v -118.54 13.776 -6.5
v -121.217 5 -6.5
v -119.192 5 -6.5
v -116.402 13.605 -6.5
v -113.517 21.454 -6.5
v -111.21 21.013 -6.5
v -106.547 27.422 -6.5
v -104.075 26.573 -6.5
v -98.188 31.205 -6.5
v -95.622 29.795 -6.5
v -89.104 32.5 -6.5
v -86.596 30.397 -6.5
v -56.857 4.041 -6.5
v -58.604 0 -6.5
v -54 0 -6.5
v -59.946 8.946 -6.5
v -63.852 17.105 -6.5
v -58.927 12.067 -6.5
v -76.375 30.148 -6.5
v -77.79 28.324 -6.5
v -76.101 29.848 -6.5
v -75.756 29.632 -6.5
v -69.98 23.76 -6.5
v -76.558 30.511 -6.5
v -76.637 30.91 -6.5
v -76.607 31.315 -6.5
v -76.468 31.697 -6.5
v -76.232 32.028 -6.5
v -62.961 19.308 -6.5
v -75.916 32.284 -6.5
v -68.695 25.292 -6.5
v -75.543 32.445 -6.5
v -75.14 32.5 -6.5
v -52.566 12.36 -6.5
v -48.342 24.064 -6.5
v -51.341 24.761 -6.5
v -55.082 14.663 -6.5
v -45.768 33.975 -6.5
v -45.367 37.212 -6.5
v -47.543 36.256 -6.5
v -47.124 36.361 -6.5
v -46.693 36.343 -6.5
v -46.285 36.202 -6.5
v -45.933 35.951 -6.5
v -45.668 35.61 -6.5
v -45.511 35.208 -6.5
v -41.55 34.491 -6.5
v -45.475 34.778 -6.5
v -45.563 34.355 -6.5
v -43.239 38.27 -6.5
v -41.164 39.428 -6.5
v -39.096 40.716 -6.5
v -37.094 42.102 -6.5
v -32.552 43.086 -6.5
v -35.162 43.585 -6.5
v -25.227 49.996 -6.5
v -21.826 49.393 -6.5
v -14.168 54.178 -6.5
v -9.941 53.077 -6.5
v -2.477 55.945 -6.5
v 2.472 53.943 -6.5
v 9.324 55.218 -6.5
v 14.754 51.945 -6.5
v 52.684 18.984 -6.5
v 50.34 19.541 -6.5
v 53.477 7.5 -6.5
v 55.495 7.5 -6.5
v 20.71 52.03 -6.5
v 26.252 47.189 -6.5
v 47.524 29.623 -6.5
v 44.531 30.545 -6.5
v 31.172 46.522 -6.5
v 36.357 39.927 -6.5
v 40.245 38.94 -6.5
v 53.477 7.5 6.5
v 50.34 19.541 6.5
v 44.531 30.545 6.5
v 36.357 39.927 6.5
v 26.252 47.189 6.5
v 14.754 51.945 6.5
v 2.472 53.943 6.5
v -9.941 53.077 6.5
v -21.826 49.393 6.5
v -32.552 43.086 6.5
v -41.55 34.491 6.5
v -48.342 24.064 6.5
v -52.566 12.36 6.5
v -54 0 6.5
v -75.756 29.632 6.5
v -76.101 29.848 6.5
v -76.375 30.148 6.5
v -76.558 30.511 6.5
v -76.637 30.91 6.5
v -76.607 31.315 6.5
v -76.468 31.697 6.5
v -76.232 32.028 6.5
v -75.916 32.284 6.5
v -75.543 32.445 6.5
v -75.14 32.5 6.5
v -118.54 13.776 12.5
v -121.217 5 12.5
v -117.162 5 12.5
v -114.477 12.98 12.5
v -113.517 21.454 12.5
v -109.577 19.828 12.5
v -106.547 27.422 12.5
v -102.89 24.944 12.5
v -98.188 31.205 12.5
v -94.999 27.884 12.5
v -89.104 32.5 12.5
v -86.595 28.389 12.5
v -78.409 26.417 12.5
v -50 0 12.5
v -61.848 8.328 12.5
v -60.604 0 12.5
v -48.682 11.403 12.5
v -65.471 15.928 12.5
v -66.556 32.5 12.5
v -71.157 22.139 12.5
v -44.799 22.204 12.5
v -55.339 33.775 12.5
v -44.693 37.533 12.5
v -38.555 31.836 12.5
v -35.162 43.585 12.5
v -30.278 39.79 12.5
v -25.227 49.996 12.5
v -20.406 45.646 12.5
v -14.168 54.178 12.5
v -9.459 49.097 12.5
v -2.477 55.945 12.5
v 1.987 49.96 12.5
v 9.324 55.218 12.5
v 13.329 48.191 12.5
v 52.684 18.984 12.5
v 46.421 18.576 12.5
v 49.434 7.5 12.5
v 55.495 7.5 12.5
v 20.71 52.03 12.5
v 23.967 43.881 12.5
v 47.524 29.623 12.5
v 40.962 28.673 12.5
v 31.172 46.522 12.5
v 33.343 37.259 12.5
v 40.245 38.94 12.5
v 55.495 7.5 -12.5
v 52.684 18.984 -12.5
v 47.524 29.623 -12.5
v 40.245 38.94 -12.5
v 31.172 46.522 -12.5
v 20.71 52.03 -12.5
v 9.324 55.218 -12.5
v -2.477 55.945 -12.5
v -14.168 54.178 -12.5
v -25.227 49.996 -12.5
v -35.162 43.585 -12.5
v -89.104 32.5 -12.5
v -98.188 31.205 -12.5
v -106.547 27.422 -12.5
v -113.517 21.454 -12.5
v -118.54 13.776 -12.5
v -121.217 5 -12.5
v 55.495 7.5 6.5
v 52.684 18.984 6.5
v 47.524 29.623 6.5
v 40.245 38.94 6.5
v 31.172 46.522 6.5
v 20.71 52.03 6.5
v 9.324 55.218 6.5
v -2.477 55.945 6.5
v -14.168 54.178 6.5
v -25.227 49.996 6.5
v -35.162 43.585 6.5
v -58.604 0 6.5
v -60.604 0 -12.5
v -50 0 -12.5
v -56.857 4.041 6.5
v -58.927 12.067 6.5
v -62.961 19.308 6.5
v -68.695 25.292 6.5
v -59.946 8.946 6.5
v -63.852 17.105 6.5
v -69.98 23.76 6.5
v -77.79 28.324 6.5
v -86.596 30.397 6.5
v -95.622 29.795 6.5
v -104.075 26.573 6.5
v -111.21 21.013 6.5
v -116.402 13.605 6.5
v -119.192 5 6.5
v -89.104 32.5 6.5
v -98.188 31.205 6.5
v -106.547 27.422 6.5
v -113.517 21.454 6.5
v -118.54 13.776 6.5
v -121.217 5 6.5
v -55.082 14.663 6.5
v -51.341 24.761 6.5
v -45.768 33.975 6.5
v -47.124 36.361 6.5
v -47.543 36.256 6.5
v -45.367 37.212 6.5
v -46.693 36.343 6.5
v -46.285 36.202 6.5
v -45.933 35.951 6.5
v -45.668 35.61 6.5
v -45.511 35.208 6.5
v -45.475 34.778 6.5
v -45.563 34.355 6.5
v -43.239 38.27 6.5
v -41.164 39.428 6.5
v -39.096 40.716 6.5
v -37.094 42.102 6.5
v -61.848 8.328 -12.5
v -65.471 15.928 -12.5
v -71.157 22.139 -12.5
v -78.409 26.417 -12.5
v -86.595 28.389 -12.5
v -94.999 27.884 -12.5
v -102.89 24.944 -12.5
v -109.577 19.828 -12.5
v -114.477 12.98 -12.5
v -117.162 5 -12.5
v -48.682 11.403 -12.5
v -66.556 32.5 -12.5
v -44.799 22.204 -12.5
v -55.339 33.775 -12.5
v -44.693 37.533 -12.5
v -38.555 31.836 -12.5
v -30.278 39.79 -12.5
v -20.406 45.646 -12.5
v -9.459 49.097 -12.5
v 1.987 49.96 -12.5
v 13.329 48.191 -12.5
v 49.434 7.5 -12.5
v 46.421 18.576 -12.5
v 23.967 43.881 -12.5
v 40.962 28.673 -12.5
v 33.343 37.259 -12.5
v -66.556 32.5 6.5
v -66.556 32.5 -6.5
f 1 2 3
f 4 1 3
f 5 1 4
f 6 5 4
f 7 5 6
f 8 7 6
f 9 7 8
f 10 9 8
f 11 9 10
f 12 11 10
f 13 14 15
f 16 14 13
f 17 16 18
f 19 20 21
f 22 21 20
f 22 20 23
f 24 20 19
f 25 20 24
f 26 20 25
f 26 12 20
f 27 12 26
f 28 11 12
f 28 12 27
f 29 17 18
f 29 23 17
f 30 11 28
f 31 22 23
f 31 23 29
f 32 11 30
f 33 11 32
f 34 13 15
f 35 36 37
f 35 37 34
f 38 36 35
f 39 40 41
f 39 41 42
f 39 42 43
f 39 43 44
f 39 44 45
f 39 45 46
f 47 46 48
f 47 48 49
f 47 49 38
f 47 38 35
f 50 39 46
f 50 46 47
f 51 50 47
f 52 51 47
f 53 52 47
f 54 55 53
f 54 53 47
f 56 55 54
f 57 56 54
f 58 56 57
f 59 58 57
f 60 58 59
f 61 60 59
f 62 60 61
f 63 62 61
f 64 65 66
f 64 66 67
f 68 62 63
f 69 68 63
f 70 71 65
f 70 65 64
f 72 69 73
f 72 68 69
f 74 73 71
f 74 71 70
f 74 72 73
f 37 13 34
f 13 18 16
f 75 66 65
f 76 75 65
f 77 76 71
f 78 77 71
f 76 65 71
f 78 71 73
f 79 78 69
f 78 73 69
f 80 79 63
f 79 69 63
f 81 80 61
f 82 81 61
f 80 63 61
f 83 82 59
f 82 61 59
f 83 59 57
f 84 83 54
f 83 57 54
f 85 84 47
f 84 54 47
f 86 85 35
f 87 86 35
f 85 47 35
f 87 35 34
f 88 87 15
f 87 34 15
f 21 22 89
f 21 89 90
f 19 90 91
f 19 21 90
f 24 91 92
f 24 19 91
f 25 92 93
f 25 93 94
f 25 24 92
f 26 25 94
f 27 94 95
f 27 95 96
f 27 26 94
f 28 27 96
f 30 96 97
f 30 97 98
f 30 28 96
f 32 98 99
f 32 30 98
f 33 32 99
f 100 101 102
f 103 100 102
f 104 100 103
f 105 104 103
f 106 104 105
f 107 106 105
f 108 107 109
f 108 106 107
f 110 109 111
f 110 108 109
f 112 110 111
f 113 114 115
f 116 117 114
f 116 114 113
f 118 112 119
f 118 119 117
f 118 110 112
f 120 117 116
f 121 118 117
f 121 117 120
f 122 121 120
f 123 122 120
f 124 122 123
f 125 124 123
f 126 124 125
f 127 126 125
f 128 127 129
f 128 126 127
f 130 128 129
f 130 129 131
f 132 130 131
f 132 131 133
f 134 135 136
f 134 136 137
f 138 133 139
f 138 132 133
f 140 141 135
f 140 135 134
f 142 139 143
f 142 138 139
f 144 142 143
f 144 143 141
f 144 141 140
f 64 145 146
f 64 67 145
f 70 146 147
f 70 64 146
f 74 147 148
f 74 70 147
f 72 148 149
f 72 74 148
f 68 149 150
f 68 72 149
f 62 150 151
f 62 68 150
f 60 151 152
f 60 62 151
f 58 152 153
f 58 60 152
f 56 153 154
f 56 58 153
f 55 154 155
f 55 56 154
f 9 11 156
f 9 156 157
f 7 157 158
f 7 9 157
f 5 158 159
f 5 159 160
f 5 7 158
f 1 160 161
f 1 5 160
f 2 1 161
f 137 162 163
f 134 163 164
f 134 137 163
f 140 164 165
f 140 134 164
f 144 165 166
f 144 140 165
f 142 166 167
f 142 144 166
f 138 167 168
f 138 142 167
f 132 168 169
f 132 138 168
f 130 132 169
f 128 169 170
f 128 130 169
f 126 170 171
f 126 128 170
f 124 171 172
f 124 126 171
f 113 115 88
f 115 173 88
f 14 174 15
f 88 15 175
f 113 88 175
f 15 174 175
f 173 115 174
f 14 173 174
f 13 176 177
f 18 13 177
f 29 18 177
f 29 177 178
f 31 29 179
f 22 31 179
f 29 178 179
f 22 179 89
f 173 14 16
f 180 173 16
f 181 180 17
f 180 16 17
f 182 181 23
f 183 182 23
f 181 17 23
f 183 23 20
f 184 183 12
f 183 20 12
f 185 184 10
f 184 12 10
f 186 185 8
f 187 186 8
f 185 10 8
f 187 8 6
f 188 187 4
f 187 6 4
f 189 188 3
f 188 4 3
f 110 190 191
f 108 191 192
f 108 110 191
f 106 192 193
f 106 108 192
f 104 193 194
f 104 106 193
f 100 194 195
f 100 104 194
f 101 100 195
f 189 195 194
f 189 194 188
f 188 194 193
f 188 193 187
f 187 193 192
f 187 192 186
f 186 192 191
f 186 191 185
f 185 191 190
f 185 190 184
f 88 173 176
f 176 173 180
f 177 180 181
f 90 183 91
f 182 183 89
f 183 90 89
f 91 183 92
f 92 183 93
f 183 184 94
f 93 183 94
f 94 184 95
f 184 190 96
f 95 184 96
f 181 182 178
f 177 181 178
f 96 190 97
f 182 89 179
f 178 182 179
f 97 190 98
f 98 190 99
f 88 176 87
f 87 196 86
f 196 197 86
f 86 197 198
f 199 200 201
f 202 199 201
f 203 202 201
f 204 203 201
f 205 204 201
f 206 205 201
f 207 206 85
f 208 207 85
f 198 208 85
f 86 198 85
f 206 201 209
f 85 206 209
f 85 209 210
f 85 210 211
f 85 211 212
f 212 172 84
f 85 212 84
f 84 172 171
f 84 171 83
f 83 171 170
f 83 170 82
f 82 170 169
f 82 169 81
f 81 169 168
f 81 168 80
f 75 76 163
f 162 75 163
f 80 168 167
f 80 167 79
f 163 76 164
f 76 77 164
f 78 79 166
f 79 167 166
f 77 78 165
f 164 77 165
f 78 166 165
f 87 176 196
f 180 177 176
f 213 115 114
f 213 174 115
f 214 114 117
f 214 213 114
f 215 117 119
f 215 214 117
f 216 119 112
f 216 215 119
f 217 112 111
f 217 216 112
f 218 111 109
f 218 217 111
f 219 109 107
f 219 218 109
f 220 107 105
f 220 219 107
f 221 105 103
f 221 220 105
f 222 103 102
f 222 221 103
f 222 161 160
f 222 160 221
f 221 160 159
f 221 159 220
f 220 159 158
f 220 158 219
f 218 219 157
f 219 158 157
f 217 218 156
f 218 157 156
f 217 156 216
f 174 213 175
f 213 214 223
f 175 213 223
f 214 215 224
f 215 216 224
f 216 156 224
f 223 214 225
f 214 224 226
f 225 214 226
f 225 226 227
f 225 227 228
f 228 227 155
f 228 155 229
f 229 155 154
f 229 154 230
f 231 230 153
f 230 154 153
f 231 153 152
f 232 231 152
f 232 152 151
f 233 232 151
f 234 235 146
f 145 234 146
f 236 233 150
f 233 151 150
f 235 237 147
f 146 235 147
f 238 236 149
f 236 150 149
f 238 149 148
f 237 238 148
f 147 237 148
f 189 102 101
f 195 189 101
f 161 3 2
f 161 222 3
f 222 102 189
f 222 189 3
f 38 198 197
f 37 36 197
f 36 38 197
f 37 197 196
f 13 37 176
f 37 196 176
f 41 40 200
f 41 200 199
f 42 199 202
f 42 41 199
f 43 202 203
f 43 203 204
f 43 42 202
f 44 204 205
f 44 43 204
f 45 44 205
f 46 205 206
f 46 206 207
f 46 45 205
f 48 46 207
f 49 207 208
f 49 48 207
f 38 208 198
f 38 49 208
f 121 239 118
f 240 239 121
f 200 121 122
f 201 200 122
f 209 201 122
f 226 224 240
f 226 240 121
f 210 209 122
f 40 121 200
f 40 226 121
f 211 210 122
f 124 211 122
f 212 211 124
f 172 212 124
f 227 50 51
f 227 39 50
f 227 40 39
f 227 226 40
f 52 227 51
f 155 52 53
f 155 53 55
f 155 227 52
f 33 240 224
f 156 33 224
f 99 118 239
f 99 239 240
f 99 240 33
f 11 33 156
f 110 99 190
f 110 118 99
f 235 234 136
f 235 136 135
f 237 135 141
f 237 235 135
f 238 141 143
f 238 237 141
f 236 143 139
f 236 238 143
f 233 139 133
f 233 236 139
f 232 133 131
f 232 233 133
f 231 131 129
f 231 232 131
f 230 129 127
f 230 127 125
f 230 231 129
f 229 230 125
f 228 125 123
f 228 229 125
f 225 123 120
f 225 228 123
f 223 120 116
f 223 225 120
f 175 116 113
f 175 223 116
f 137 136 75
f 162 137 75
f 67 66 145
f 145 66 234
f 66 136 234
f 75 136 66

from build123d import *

# Parameters (mm, degrees)
SKETCH1_R                     = 56
SKETCH1_R_2                   = 50
MAIN_SHAPE_DEPTH              = 12.5
LIGHT_MOUNT_REACH             = 82.176
LIGHT_MOUNT_DIRECTION_2_REACH = 82.176
SKETCH3_R                     = 57
SKETCH3_R_2                   = 54
MAIN_SLOT_DEPTH               = 6.5
LIGHT_CUT_DEPTH               = 135.461332618
LIGHT_CUT_DEPTH_BACK          = 135.461332618
SKETCH8_R                     = 28.5
SKETCH9_R                     = 32.5
SKETCH9_R_2                   = 30.5
LIGHT_SLOT_DEPTH              = 6.5
LIGHT_MOUNT_FILLET_R          = 50
SKETCH17_W                    = 4.884048614
SKETCH17_H                    = 10
LIGHT_KEYWAY_DEPTH            = 137.193244948
SKETCH19_W                    = 25
SKETCH19_H                    = 15
CUT_EXTRUDE1_DEPTH            = 135.11151246
FILLET1_START                 = -6.5
FILLET1_DEPTH                 = 13
SKETCH20_W                    = 284.103750492
SKETCH20_H                    = 110.008077322
CUT_EXTRUDE2_DEPTH            = 135.11151246


with BuildPart() as part:
    # Sketch1 → main shape (new, symmetric)
    with BuildSketch(Plane.XY):
        Circle(SKETCH1_R)
        Circle(SKETCH1_R_2, mode=Mode.SUBTRACT)
    extrude(amount=MAIN_SHAPE_DEPTH, both=True)

    # light mount: up to this face of the body (flat: up to its plane)
    light_mount_end = Plane(part.part.faces().sort_by_distance((-54.41608081, 0, 12.5))[0])
    # Sketch6 → light mount (add, up to the picked face)
    with BuildSketch(Plane.XY, mode=Mode.PRIVATE) as light_mount_sk1:
        with BuildLine():
            Line((-45.604276115, 32.5), (-89.104276115, 32.5))
            ThreePointArc((-89.104276115, 32.5), (-121.604276115, 0), (-89.104276115, -32.5))
            Line((-89.104276115, -32.5), (-45.604276115, -32.5))
            ThreePointArc((-45.604276115, -32.5), (-56, 0), (-45.604276115, 32.5))
        make_face()
    light_mount_tool1 = split(extrude(light_mount_sk1.sketch, amount=LIGHT_MOUNT_REACH, mode=Mode.PRIVATE), bisect_by=light_mount_end, keep=Keep.BOTH, mode=Mode.PRIVATE)
    add(light_mount_tool1.solids().sort_by(Axis((-84.001692, 0, 0), (0, 0, 1)))[0])

    # light mount direction 2: up to this face of the body (flat: up to its plane)
    light_mount_direction_2_end = Plane(part.part.faces().sort_by_distance((-54.41608081, 0, -12.5))[0])
    # Sketch6 → light mount direction 2 (add, up to the picked face)
    with BuildSketch(Plane.XY, mode=Mode.PRIVATE) as light_mount_direction_2_sk1:
        with BuildLine():
            Line((-45.604276115, 32.5), (-89.104276115, 32.5))
            ThreePointArc((-89.104276115, 32.5), (-121.604276115, 0), (-89.104276115, -32.5))
            Line((-89.104276115, -32.5), (-45.604276115, -32.5))
            ThreePointArc((-45.604276115, -32.5), (-56, 0), (-45.604276115, 32.5))
        make_face()
    light_mount_direction_2_tool1 = split(extrude(light_mount_direction_2_sk1.sketch, amount=-LIGHT_MOUNT_DIRECTION_2_REACH, mode=Mode.PRIVATE), bisect_by=light_mount_direction_2_end, keep=Keep.BOTH, mode=Mode.PRIVATE)
    add(light_mount_direction_2_tool1.solids().sort_by(Axis((-84.001692, 0, 0), (0, 0, -1)))[0])

    # Sketch3 → main slot (cut, symmetric)
    with BuildSketch(Plane.XY):
        Circle(SKETCH3_R)
        Circle(SKETCH3_R_2, mode=Mode.SUBTRACT)
    extrude(amount=MAIN_SLOT_DEPTH, both=True, mode=Mode.SUBTRACT)

    # Sketch8 → light cut (cut, two sides: drawn at the far end of the back side and taken through both)
    with BuildSketch(Plane.XY.offset(-LIGHT_CUT_DEPTH_BACK)):
        with Locations((-89.104276115, 0)):
            Circle(SKETCH8_R)
    extrude(amount=LIGHT_CUT_DEPTH + LIGHT_CUT_DEPTH_BACK, mode=Mode.SUBTRACT)

    # Sketch9 → light slot (cut, symmetric)
    with BuildSketch(Plane.XY):
        with Locations((-89.104276115, 0)):
            Circle(SKETCH9_R)
        with Locations((-89.104276115, 0)):
            Circle(SKETCH9_R_2, mode=Mode.SUBTRACT)
    extrude(amount=LIGHT_SLOT_DEPTH, both=True, mode=Mode.SUBTRACT)

    # light mount fillet
    # the kernel refuses this fillet: 50 mm, written as the material it adds along each edge
    with BuildSketch(Plane(origin=(-45.604276115, 32.5, -12.5), x_dir=(0.6856978375591282, 0.7278863067586417, 0), z_dir=(0, 0, 1))) as light_mount_fillet_piece_1_section:
        with BuildLine():
            CenterArc((22.027511865, 49.535631995), LIGHT_MOUNT_FILLET_R, 223.290512858, 38.89464037)
            Line((-14.366803473, 15.250740117), (0, 0))
            ThreePointArc((0, 0), (7.614448546, 0.520092165), (15.228897092, 0))
        make_face()
    light_mount_fillet_piece_1 = extrude(amount=6, mode=Mode.PRIVATE)
    light_mount_fillet_piece_1 = light_mount_fillet_piece_1 & Plane(origin=(0, 0, -12.5), x_dir=(1, 0, 0), z_dir=(0, 0, 1)) * Cylinder(57, 74, mode=Mode.PRIVATE)
    add(light_mount_fillet_piece_1)
    with BuildSketch(Plane(origin=(-45.604276115, 32.5, -12.5), x_dir=(0.6856978375591282, 0.7278863067586417, 0), z_dir=(0, 0, 1))) as light_mount_fillet_piece_2_section:
        with BuildLine():
            CenterArc((22.027511865, 49.535631995), LIGHT_MOUNT_FILLET_R, 223.290512858, 38.89464037)
            Line((-14.366803473, 15.250740117), (0, 0))
            ThreePointArc((0, 0), (7.614448546, 0.520092165), (15.228897092, 0))
        make_face()
    light_mount_fillet_piece_2 = extrude(amount=6, mode=Mode.PRIVATE)
    light_mount_fillet_piece_2 = light_mount_fillet_piece_2 - Plane(origin=(0, 0, -12.5), x_dir=(1, 0, 0), z_dir=(0, 0, 1)) * Cylinder(57, 74, mode=Mode.PRIVATE)
    add(light_mount_fillet_piece_2)
    with BuildSketch(Plane(origin=(-45.604276115, 32.5, -12.5), x_dir=(0.6856978375591282, 0.7278863067586417, 0), z_dir=(0, 0, 1))) as light_mount_fillet_piece_3_section:
        with BuildLine():
            CenterArc((22.027511865, 49.535631995), LIGHT_MOUNT_FILLET_R, 223.290512858, 38.89464037)
            Line((-14.366803473, 15.250740117), (0, 0))
            ThreePointArc((0, 0), (7.614448546, 0.520092165), (15.228897092, 0))
        make_face()
    light_mount_fillet_piece_3 = extrude(amount=58.380227433, mode=Mode.PRIVATE)
    light_mount_fillet_piece_3 = split(light_mount_fillet_piece_3, bisect_by=Plane(origin=(-45.604276115, 32.5, -6.5), z_dir=(0, 0, 1)), keep=Keep.TOP, mode=Mode.PRIVATE)
    light_mount_fillet_piece_3 = split(light_mount_fillet_piece_3, bisect_by=Plane(origin=(-45.604276115, 32.5, 6.5), z_dir=(0, 0, -1)), keep=Keep.TOP, mode=Mode.PRIVATE)
    light_mount_fillet_piece_3 = light_mount_fillet_piece_3 - Plane(origin=(0, 0, -12.5), x_dir=(1, 0, 0), z_dir=(0, 0, 1)) * Cylinder(57, 178, mode=Mode.PRIVATE)
    add(light_mount_fillet_piece_3)
    with BuildSketch(Plane(origin=(-45.604276115, 32.5, -12.5), x_dir=(0.6856978375591282, 0.7278863067586417, 0), z_dir=(0, 0, 1))) as light_mount_fillet_piece_4_section:
        with BuildLine():
            CenterArc((22.027511865, 49.535631995), LIGHT_MOUNT_FILLET_R, 223.290512858, 38.89464037)
            Line((-14.366803473, 15.250740117), (0, 0))
            ThreePointArc((0, 0), (7.614448546, 0.520092165), (15.228897092, 0))
        make_face()
    light_mount_fillet_piece_4 = extrude(amount=58.380227433, mode=Mode.PRIVATE)
    light_mount_fillet_piece_4 = split(light_mount_fillet_piece_4, bisect_by=Plane(origin=(-45.604276115, 32.5, 12.5), z_dir=(0, 0, -1)), keep=Keep.TOP, mode=Mode.PRIVATE)
    light_mount_fillet_piece_4 = split(light_mount_fillet_piece_4, bisect_by=Plane(origin=(-45.604276115, 32.5, 6.5), z_dir=(0, 0, 1)), keep=Keep.TOP, mode=Mode.PRIVATE)
    light_mount_fillet_piece_4 = light_mount_fillet_piece_4 & Plane(origin=(0, 0, -12.5), x_dir=(1, 0, 0), z_dir=(0, 0, 1)) * Cylinder(57, 178, mode=Mode.PRIVATE)
    add(light_mount_fillet_piece_4)
    with BuildSketch(Plane(origin=(-45.604276115, 32.5, -12.5), x_dir=(0.6856978375591282, 0.7278863067586417, 0), z_dir=(0, 0, 1))) as light_mount_fillet_piece_5_section:
        with BuildLine():
            CenterArc((22.027511865, 49.535631995), LIGHT_MOUNT_FILLET_R, 223.290512858, 38.89464037)
            Line((-14.366803473, 15.250740117), (0, 0))
            ThreePointArc((0, 0), (7.614448546, 0.520092165), (15.228897092, 0))
        make_face()
    light_mount_fillet_piece_5 = extrude(amount=58.380227433, mode=Mode.PRIVATE)
    light_mount_fillet_piece_5 = split(light_mount_fillet_piece_5, bisect_by=Plane(origin=(-45.604276115, 32.5, 12.5), z_dir=(0, 0, -1)), keep=Keep.TOP, mode=Mode.PRIVATE)
    light_mount_fillet_piece_5 = split(light_mount_fillet_piece_5, bisect_by=Plane(origin=(-45.604276115, 32.5, 6.5), z_dir=(0, 0, 1)), keep=Keep.TOP, mode=Mode.PRIVATE)
    light_mount_fillet_piece_5 = light_mount_fillet_piece_5 - Plane(origin=(0, 0, -12.5), x_dir=(1, 0, 0), z_dir=(0, 0, 1)) * Cylinder(57, 178, mode=Mode.PRIVATE)
    add(light_mount_fillet_piece_5)
    with BuildSketch(Plane(origin=(-45.604276115, 32.5, -45.880227433), x_dir=(-1, 0, 0), z_dir=(0, 0, 1))) as light_mount_fillet_piece_6_section:
        with BuildLine():
            CenterArc((20.952090973, -50), LIGHT_MOUNT_FILLET_R, 90, 38.89464037)
            ThreePointArc((-10.442421804, -11.08490566), (-4.842642937, -5.899078903), (0, 0))
            Line((0, 0), (20.952090973, 0))
        make_face()
    light_mount_fillet_piece_6 = extrude(amount=58.380227433, mode=Mode.PRIVATE)
    light_mount_fillet_piece_6 = split(light_mount_fillet_piece_6, bisect_by=Plane(origin=(-45.604276115, 32.5, -6.5), z_dir=(0, 0, -1)), keep=Keep.TOP, mode=Mode.PRIVATE)
    light_mount_fillet_piece_6 = split(light_mount_fillet_piece_6, bisect_by=Plane(origin=(-45.604276115, 32.5, -12.5), z_dir=(0, 0, 1)), keep=Keep.TOP, mode=Mode.PRIVATE)
    light_mount_fillet_piece_6 = light_mount_fillet_piece_6 - Plane(origin=(0, 0, -45.880227433), x_dir=(1, 0, 0), z_dir=(0, 0, 1)) * Cylinder(57, 201, mode=Mode.PRIVATE)
    add(light_mount_fillet_piece_6)
    with BuildSketch(Plane(origin=(-45.604276115, 32.5, -45.880227433), x_dir=(-1, 0, 0), z_dir=(0, 0, 1))) as light_mount_fillet_piece_7_section:
        with BuildLine():
            CenterArc((20.952090973, -50), LIGHT_MOUNT_FILLET_R, 90, 38.89464037)
            ThreePointArc((-10.442421804, -11.08490566), (-4.842642937, -5.899078903), (0, 0))
            Line((0, 0), (20.952090973, 0))
        make_face()
    light_mount_fillet_piece_7 = extrude(amount=58.380227433, mode=Mode.PRIVATE)
    light_mount_fillet_piece_7 = split(light_mount_fillet_piece_7, bisect_by=Plane(origin=(-45.604276115, 32.5, -6.5), z_dir=(0, 0, -1)), keep=Keep.TOP, mode=Mode.PRIVATE)
    light_mount_fillet_piece_7 = split(light_mount_fillet_piece_7, bisect_by=Plane(origin=(-45.604276115, 32.5, -12.5), z_dir=(0, 0, 1)), keep=Keep.TOP, mode=Mode.PRIVATE)
    light_mount_fillet_piece_7 = light_mount_fillet_piece_7 & Plane(origin=(0, 0, -45.880227433), x_dir=(1, 0, 0), z_dir=(0, 0, 1)) * Cylinder(57, 201, mode=Mode.PRIVATE)
    add(light_mount_fillet_piece_7)
    with BuildSketch(Plane(origin=(-45.604276115, 32.5, -45.880227433), x_dir=(-1, 0, 0), z_dir=(0, 0, 1))) as light_mount_fillet_piece_8_section:
        with BuildLine():
            CenterArc((20.952090973, -50), LIGHT_MOUNT_FILLET_R, 90, 38.89464037)
            ThreePointArc((-10.442421804, -11.08490566), (-4.842642937, -5.899078903), (0, 0))
            Line((0, 0), (20.952090973, 0))
        make_face()
    light_mount_fillet_piece_8 = extrude(amount=58.380227433, mode=Mode.PRIVATE)
    light_mount_fillet_piece_8 = split(light_mount_fillet_piece_8, bisect_by=Plane(origin=(-45.604276115, 32.5, -6.5), z_dir=(0, 0, 1)), keep=Keep.TOP, mode=Mode.PRIVATE)
    light_mount_fillet_piece_8 = split(light_mount_fillet_piece_8, bisect_by=Plane(origin=(-45.604276115, 32.5, 6.5), z_dir=(0, 0, -1)), keep=Keep.TOP, mode=Mode.PRIVATE)
    light_mount_fillet_piece_8 = light_mount_fillet_piece_8 - Plane(origin=(0, 0, -45.880227433), x_dir=(1, 0, 0), z_dir=(0, 0, 1)) * Cylinder(57, 201, mode=Mode.PRIVATE)
    add(light_mount_fillet_piece_8)
    with BuildSketch(Plane(origin=(-45.604276115, 32.5, 6.5), x_dir=(-1, 0, 0), z_dir=(0, 0, 1))) as light_mount_fillet_piece_9_section:
        with BuildLine():
            CenterArc((20.952090973, -50), LIGHT_MOUNT_FILLET_R, 90, 38.89464037)
            ThreePointArc((-10.442421804, -11.08490566), (-4.842642937, -5.899078903), (0, 0))
            Line((0, 0), (20.952090973, 0))
        make_face()
    light_mount_fillet_piece_9 = extrude(amount=6, mode=Mode.PRIVATE)
    light_mount_fillet_piece_9 = light_mount_fillet_piece_9 - Plane(origin=(0, 0, 6.5), x_dir=(1, 0, 0), z_dir=(0, 0, 1)) * Cylinder(57, 96, mode=Mode.PRIVATE)
    add(light_mount_fillet_piece_9)
    with BuildSketch(Plane(origin=(-45.604276115, 32.5, 6.5), x_dir=(-1, 0, 0), z_dir=(0, 0, 1))) as light_mount_fillet_piece_10_section:
        with BuildLine():
            CenterArc((20.952090973, -50), LIGHT_MOUNT_FILLET_R, 90, 38.89464037)
            ThreePointArc((-10.442421804, -11.08490566), (-4.842642937, -5.899078903), (0, 0))
            Line((0, 0), (20.952090973, 0))
        make_face()
    light_mount_fillet_piece_10 = extrude(amount=6, mode=Mode.PRIVATE)
    light_mount_fillet_piece_10 = light_mount_fillet_piece_10 & Plane(origin=(0, 0, 6.5), x_dir=(1, 0, 0), z_dir=(0, 0, 1)) * Cylinder(57, 96, mode=Mode.PRIVATE)
    add(light_mount_fillet_piece_10)
    with BuildSketch(Plane(origin=(-45.604276115, -32.5, 12.5), x_dir=(-1, 0, 0), z_dir=(0, 0, -1))) as light_mount_fillet_piece_11_section:
        with BuildLine():
            CenterArc((20.952090973, -50), LIGHT_MOUNT_FILLET_R, 90, 38.89464037)
            ThreePointArc((-10.442421804, -11.08490566), (-4.842642937, -5.899078903), (0, 0))
            Line((0, 0), (20.952090973, 0))
        make_face()
    light_mount_fillet_piece_11 = extrude(amount=6, mode=Mode.PRIVATE)
    light_mount_fillet_piece_11 = light_mount_fillet_piece_11 - Plane(origin=(0, 0, 12.5), x_dir=(1, 0, 0), z_dir=(0, 0, 1)) * Cylinder(57, 96, mode=Mode.PRIVATE)
    add(light_mount_fillet_piece_11)
    with BuildSketch(Plane(origin=(-45.604276115, -32.5, 12.5), x_dir=(-1, 0, 0), z_dir=(0, 0, -1))) as light_mount_fillet_piece_12_section:
        with BuildLine():
            CenterArc((20.952090973, -50), LIGHT_MOUNT_FILLET_R, 90, 38.89464037)
            ThreePointArc((-10.442421804, -11.08490566), (-4.842642937, -5.899078903), (0, 0))
            Line((0, 0), (20.952090973, 0))
        make_face()
    light_mount_fillet_piece_12 = extrude(amount=6, mode=Mode.PRIVATE)
    light_mount_fillet_piece_12 = light_mount_fillet_piece_12 & Plane(origin=(0, 0, 12.5), x_dir=(1, 0, 0), z_dir=(0, 0, 1)) * Cylinder(57, 96, mode=Mode.PRIVATE)
    add(light_mount_fillet_piece_12)
    with BuildSketch(Plane(origin=(-45.604276115, -32.5, 12.5), x_dir=(-1, 0, 0), z_dir=(0, 0, -1))) as light_mount_fillet_piece_13_section:
        with BuildLine():
            CenterArc((20.952090973, -50), LIGHT_MOUNT_FILLET_R, 90, 38.89464037)
            ThreePointArc((-10.442421804, -11.08490566), (-4.842642937, -5.899078903), (0, 0))
            Line((0, 0), (20.952090973, 0))
        make_face()
    light_mount_fillet_piece_13 = extrude(amount=58.380227433, mode=Mode.PRIVATE)
    light_mount_fillet_piece_13 = split(light_mount_fillet_piece_13, bisect_by=Plane(origin=(-45.604276115, -32.5, -6.5), z_dir=(0, 0, 1)), keep=Keep.TOP, mode=Mode.PRIVATE)
    light_mount_fillet_piece_13 = split(light_mount_fillet_piece_13, bisect_by=Plane(origin=(-45.604276115, -32.5, 6.5), z_dir=(0, 0, -1)), keep=Keep.TOP, mode=Mode.PRIVATE)
    light_mount_fillet_piece_13 = light_mount_fillet_piece_13 - Plane(origin=(0, 0, 12.5), x_dir=(1, 0, 0), z_dir=(0, 0, 1)) * Cylinder(57, 201, mode=Mode.PRIVATE)
    add(light_mount_fillet_piece_13)
    with BuildSketch(Plane(origin=(-45.604276115, -32.5, 12.5), x_dir=(-1, 0, 0), z_dir=(0, 0, -1))) as light_mount_fillet_piece_14_section:
        with BuildLine():
            CenterArc((20.952090973, -50), LIGHT_MOUNT_FILLET_R, 90, 38.89464037)
            ThreePointArc((-10.442421804, -11.08490566), (-4.842642937, -5.899078903), (0, 0))
            Line((0, 0), (20.952090973, 0))
        make_face()
    light_mount_fillet_piece_14 = extrude(amount=58.380227433, mode=Mode.PRIVATE)
    light_mount_fillet_piece_14 = split(light_mount_fillet_piece_14, bisect_by=Plane(origin=(-45.604276115, -32.5, -6.5), z_dir=(0, 0, -1)), keep=Keep.TOP, mode=Mode.PRIVATE)
    light_mount_fillet_piece_14 = split(light_mount_fillet_piece_14, bisect_by=Plane(origin=(-45.604276115, -32.5, -12.5), z_dir=(0, 0, 1)), keep=Keep.TOP, mode=Mode.PRIVATE)
    light_mount_fillet_piece_14 = light_mount_fillet_piece_14 - Plane(origin=(0, 0, 12.5), x_dir=(1, 0, 0), z_dir=(0, 0, 1)) * Cylinder(57, 201, mode=Mode.PRIVATE)
    add(light_mount_fillet_piece_14)
    with BuildSketch(Plane(origin=(-45.604276115, -32.5, 12.5), x_dir=(-1, 0, 0), z_dir=(0, 0, -1))) as light_mount_fillet_piece_15_section:
        with BuildLine():
            CenterArc((20.952090973, -50), LIGHT_MOUNT_FILLET_R, 90, 38.89464037)
            ThreePointArc((-10.442421804, -11.08490566), (-4.842642937, -5.899078903), (0, 0))
            Line((0, 0), (20.952090973, 0))
        make_face()
    light_mount_fillet_piece_15 = extrude(amount=58.380227433, mode=Mode.PRIVATE)
    light_mount_fillet_piece_15 = split(light_mount_fillet_piece_15, bisect_by=Plane(origin=(-45.604276115, -32.5, -6.5), z_dir=(0, 0, -1)), keep=Keep.TOP, mode=Mode.PRIVATE)
    light_mount_fillet_piece_15 = split(light_mount_fillet_piece_15, bisect_by=Plane(origin=(-45.604276115, -32.5, -12.5), z_dir=(0, 0, 1)), keep=Keep.TOP, mode=Mode.PRIVATE)
    light_mount_fillet_piece_15 = light_mount_fillet_piece_15 & Plane(origin=(0, 0, 12.5), x_dir=(1, 0, 0), z_dir=(0, 0, 1)) * Cylinder(57, 201, mode=Mode.PRIVATE)
    add(light_mount_fillet_piece_15)
    with BuildSketch(Plane(origin=(-45.604276115, -32.5, 45.880227433), x_dir=(0.6856978375591277, -0.7278863067586421, 0), z_dir=(0, 0, -1))) as light_mount_fillet_piece_16_section:
        with BuildLine():
            CenterArc((22.027511865, 49.535631995), LIGHT_MOUNT_FILLET_R, 223.290512858, 38.89464037)
            Line((-14.366803473, 15.250740117), (0, 0))
            ThreePointArc((0, 0), (7.614448546, 0.520092165), (15.228897092, 0))
        make_face()
    light_mount_fillet_piece_16 = extrude(amount=58.380227433, mode=Mode.PRIVATE)
    light_mount_fillet_piece_16 = split(light_mount_fillet_piece_16, bisect_by=Plane(origin=(-45.604276115, -32.5, 6.5), z_dir=(0, 0, 1)), keep=Keep.TOP, mode=Mode.PRIVATE)
    light_mount_fillet_piece_16 = light_mount_fillet_piece_16 & Plane(origin=(0, 0, 45.880227433), x_dir=(1, 0, 0), z_dir=(0, 0, 1)) * Cylinder(57, 178, mode=Mode.PRIVATE)
    light_mount_fillet_piece_16 = split(light_mount_fillet_piece_16, bisect_by=Plane(origin=(-45.604276115, -32.5, 12.5), z_dir=(0, 0, -1)), keep=Keep.TOP, mode=Mode.PRIVATE)
    add(light_mount_fillet_piece_16)
    with BuildSketch(Plane(origin=(-45.604276115, -32.5, 45.880227433), x_dir=(0.6856978375591277, -0.7278863067586421, 0), z_dir=(0, 0, -1))) as light_mount_fillet_piece_17_section:
        with BuildLine():
            CenterArc((22.027511865, 49.535631995), LIGHT_MOUNT_FILLET_R, 223.290512858, 38.89464037)
            Line((-14.366803473, 15.250740117), (0, 0))
            ThreePointArc((0, 0), (7.614448546, 0.520092165), (15.228897092, 0))
        make_face()
    light_mount_fillet_piece_17 = extrude(amount=58.380227433, mode=Mode.PRIVATE)
    light_mount_fillet_piece_17 = split(light_mount_fillet_piece_17, bisect_by=Plane(origin=(-45.604276115, -32.5, 6.5), z_dir=(0, 0, 1)), keep=Keep.TOP, mode=Mode.PRIVATE)
    light_mount_fillet_piece_17 = light_mount_fillet_piece_17 - Plane(origin=(0, 0, 45.880227433), x_dir=(1, 0, 0), z_dir=(0, 0, 1)) * Cylinder(57, 178, mode=Mode.PRIVATE)
    light_mount_fillet_piece_17 = split(light_mount_fillet_piece_17, bisect_by=Plane(origin=(-45.604276115, -32.5, 12.5), z_dir=(0, 0, -1)), keep=Keep.TOP, mode=Mode.PRIVATE)
    add(light_mount_fillet_piece_17)
    with BuildSketch(Plane(origin=(-45.604276115, -32.5, 45.880227433), x_dir=(0.6856978375591277, -0.7278863067586421, 0), z_dir=(0, 0, -1))) as light_mount_fillet_piece_18_section:
        with BuildLine():
            CenterArc((22.027511865, 49.535631995), LIGHT_MOUNT_FILLET_R, 223.290512858, 38.89464037)
            Line((-14.366803473, 15.250740117), (0, 0))
            ThreePointArc((0, 0), (7.614448546, 0.520092165), (15.228897092, 0))
        make_face()
    light_mount_fillet_piece_18 = extrude(amount=58.380227433, mode=Mode.PRIVATE)
    light_mount_fillet_piece_18 = split(light_mount_fillet_piece_18, bisect_by=Plane(origin=(-45.604276115, -32.5, -6.5), z_dir=(0, 0, 1)), keep=Keep.TOP, mode=Mode.PRIVATE)
    light_mount_fillet_piece_18 = split(light_mount_fillet_piece_18, bisect_by=Plane(origin=(-45.604276115, -32.5, 6.5), z_dir=(0, 0, -1)), keep=Keep.TOP, mode=Mode.PRIVATE)
    light_mount_fillet_piece_18 = light_mount_fillet_piece_18 - Plane(origin=(0, 0, 45.880227433), x_dir=(1, 0, 0), z_dir=(0, 0, 1)) * Cylinder(57, 178, mode=Mode.PRIVATE)
    add(light_mount_fillet_piece_18)
    with BuildSketch(Plane(origin=(-45.604276115, -32.5, -6.5), x_dir=(0.6856978375591277, -0.7278863067586421, 0), z_dir=(0, 0, -1))) as light_mount_fillet_piece_19_section:
        with BuildLine():
            CenterArc((22.027511865, 49.535631995), LIGHT_MOUNT_FILLET_R, 223.290512858, 38.89464037)
            Line((-14.366803473, 15.250740117), (0, 0))
            ThreePointArc((0, 0), (7.614448546, 0.520092165), (15.228897092, 0))
        make_face()
    light_mount_fillet_piece_19 = extrude(amount=6, mode=Mode.PRIVATE)
    light_mount_fillet_piece_19 = light_mount_fillet_piece_19 & Plane(origin=(0, 0, -6.5), x_dir=(1, 0, 0), z_dir=(0, 0, 1)) * Cylinder(57, 74, mode=Mode.PRIVATE)
    add(light_mount_fillet_piece_19)
    with BuildSketch(Plane(origin=(-45.604276115, -32.5, -6.5), x_dir=(0.6856978375591277, -0.7278863067586421, 0), z_dir=(0, 0, -1))) as light_mount_fillet_piece_20_section:
        with BuildLine():
            CenterArc((22.027511865, 49.535631995), LIGHT_MOUNT_FILLET_R, 223.290512858, 38.89464037)
            Line((-14.366803473, 15.250740117), (0, 0))
            ThreePointArc((0, 0), (7.614448546, 0.520092165), (15.228897092, 0))
        make_face()
    light_mount_fillet_piece_20 = extrude(amount=6, mode=Mode.PRIVATE)
    light_mount_fillet_piece_20 = light_mount_fillet_piece_20 - Plane(origin=(0, 0, -6.5), x_dir=(1, 0, 0), z_dir=(0, 0, 1)) * Cylinder(57, 74, mode=Mode.PRIVATE)
    add(light_mount_fillet_piece_20)

    # Sketch17 → light keyway (cut, through all)
    with BuildSketch(Plane(origin=(0, 0, -12.5), x_dir=(-1, 0, 0), z_dir=(0, 0, -1))):
        with Locations((119.604276115, 0)):
            Rectangle(SKETCH17_W, SKETCH17_H)
    extrude(amount=-LIGHT_KEYWAY_DEPTH, mode=Mode.SUBTRACT)

    # Sketch19 → Cut-Extrude1 (cut, through all)
    with BuildSketch(Plane(origin=(0, 0, 0), x_dir=(0, 0, -1), z_dir=(1, 0, 0))):
        Rectangle(SKETCH19_W, SKETCH19_H)
    extrude(amount=CUT_EXTRUDE1_DEPTH, mode=Mode.SUBTRACT)

    # Fillet1: read off the stored shape, not the designer's step
    # Fillet1 outline → Fillet1 (cut)
    with BuildSketch(Plane.XY.offset(FILLET1_START)):
        with BuildLine():
            ThreePointArc((-41.163605135, -39.427878618), (-43.551229208, -36.773501798), (-45.767993257, -33.974855309))
            ThreePointArc((-45.767993257, -33.974855309), (-45.788490057, -35.789975391), (-47.542820528, -36.256243154))
            ThreePointArc((-47.542820528, -36.256243154), (-44.296652875, -37.728299974), (-41.163605135, -39.427878618))
        make_face()
        with BuildLine():
            ThreePointArc((-75.140036072, -32.5), (-76.606574613, -31.315063018), (-75.756105485, -29.632352941))
            ThreePointArc((-75.756105485, -29.632352941), (-82.277910705, -31.775001735), (-89.104276115, -32.5))
            Line((-89.104276115, -32.5), (-75.140036072, -32.5))
        make_face()
        with BuildLine():
            ThreePointArc((-47.542820528, 36.256243154), (-45.788490057, 35.789975391), (-45.767993256, 33.974855309))
            ThreePointArc((-45.767993256, 33.974855309), (-43.551229208, 36.773501798), (-41.163605135, 39.427878618))
            ThreePointArc((-41.163605135, 39.427878618), (-44.296652875, 37.728299974), (-47.542820528, 36.256243154))
        make_face()
        with BuildLine():
            ThreePointArc((-89.104276115, 32.5), (-82.277910705, 31.775001735), (-75.756105485, 29.632352941))
            ThreePointArc((-75.756105485, 29.632352941), (-76.606574613, 31.315063018), (-75.140036072, 32.5))
            Line((-75.140036072, 32.5), (-89.104276115, 32.5))
        make_face()
    extrude(amount=FILLET1_DEPTH, mode=Mode.SUBTRACT)

    # Sketch20 → Cut-Extrude2 (cut, through all)
    with BuildSketch(Plane(origin=(0, 0, 0), x_dir=(1, 0, 0), z_dir=(0, 1, 0))):
        Rectangle(SKETCH20_W, SKETCH20_H)
    extrude(amount=-CUT_EXTRUDE2_DEPTH, mode=Mode.SUBTRACT)


solid = part.part
